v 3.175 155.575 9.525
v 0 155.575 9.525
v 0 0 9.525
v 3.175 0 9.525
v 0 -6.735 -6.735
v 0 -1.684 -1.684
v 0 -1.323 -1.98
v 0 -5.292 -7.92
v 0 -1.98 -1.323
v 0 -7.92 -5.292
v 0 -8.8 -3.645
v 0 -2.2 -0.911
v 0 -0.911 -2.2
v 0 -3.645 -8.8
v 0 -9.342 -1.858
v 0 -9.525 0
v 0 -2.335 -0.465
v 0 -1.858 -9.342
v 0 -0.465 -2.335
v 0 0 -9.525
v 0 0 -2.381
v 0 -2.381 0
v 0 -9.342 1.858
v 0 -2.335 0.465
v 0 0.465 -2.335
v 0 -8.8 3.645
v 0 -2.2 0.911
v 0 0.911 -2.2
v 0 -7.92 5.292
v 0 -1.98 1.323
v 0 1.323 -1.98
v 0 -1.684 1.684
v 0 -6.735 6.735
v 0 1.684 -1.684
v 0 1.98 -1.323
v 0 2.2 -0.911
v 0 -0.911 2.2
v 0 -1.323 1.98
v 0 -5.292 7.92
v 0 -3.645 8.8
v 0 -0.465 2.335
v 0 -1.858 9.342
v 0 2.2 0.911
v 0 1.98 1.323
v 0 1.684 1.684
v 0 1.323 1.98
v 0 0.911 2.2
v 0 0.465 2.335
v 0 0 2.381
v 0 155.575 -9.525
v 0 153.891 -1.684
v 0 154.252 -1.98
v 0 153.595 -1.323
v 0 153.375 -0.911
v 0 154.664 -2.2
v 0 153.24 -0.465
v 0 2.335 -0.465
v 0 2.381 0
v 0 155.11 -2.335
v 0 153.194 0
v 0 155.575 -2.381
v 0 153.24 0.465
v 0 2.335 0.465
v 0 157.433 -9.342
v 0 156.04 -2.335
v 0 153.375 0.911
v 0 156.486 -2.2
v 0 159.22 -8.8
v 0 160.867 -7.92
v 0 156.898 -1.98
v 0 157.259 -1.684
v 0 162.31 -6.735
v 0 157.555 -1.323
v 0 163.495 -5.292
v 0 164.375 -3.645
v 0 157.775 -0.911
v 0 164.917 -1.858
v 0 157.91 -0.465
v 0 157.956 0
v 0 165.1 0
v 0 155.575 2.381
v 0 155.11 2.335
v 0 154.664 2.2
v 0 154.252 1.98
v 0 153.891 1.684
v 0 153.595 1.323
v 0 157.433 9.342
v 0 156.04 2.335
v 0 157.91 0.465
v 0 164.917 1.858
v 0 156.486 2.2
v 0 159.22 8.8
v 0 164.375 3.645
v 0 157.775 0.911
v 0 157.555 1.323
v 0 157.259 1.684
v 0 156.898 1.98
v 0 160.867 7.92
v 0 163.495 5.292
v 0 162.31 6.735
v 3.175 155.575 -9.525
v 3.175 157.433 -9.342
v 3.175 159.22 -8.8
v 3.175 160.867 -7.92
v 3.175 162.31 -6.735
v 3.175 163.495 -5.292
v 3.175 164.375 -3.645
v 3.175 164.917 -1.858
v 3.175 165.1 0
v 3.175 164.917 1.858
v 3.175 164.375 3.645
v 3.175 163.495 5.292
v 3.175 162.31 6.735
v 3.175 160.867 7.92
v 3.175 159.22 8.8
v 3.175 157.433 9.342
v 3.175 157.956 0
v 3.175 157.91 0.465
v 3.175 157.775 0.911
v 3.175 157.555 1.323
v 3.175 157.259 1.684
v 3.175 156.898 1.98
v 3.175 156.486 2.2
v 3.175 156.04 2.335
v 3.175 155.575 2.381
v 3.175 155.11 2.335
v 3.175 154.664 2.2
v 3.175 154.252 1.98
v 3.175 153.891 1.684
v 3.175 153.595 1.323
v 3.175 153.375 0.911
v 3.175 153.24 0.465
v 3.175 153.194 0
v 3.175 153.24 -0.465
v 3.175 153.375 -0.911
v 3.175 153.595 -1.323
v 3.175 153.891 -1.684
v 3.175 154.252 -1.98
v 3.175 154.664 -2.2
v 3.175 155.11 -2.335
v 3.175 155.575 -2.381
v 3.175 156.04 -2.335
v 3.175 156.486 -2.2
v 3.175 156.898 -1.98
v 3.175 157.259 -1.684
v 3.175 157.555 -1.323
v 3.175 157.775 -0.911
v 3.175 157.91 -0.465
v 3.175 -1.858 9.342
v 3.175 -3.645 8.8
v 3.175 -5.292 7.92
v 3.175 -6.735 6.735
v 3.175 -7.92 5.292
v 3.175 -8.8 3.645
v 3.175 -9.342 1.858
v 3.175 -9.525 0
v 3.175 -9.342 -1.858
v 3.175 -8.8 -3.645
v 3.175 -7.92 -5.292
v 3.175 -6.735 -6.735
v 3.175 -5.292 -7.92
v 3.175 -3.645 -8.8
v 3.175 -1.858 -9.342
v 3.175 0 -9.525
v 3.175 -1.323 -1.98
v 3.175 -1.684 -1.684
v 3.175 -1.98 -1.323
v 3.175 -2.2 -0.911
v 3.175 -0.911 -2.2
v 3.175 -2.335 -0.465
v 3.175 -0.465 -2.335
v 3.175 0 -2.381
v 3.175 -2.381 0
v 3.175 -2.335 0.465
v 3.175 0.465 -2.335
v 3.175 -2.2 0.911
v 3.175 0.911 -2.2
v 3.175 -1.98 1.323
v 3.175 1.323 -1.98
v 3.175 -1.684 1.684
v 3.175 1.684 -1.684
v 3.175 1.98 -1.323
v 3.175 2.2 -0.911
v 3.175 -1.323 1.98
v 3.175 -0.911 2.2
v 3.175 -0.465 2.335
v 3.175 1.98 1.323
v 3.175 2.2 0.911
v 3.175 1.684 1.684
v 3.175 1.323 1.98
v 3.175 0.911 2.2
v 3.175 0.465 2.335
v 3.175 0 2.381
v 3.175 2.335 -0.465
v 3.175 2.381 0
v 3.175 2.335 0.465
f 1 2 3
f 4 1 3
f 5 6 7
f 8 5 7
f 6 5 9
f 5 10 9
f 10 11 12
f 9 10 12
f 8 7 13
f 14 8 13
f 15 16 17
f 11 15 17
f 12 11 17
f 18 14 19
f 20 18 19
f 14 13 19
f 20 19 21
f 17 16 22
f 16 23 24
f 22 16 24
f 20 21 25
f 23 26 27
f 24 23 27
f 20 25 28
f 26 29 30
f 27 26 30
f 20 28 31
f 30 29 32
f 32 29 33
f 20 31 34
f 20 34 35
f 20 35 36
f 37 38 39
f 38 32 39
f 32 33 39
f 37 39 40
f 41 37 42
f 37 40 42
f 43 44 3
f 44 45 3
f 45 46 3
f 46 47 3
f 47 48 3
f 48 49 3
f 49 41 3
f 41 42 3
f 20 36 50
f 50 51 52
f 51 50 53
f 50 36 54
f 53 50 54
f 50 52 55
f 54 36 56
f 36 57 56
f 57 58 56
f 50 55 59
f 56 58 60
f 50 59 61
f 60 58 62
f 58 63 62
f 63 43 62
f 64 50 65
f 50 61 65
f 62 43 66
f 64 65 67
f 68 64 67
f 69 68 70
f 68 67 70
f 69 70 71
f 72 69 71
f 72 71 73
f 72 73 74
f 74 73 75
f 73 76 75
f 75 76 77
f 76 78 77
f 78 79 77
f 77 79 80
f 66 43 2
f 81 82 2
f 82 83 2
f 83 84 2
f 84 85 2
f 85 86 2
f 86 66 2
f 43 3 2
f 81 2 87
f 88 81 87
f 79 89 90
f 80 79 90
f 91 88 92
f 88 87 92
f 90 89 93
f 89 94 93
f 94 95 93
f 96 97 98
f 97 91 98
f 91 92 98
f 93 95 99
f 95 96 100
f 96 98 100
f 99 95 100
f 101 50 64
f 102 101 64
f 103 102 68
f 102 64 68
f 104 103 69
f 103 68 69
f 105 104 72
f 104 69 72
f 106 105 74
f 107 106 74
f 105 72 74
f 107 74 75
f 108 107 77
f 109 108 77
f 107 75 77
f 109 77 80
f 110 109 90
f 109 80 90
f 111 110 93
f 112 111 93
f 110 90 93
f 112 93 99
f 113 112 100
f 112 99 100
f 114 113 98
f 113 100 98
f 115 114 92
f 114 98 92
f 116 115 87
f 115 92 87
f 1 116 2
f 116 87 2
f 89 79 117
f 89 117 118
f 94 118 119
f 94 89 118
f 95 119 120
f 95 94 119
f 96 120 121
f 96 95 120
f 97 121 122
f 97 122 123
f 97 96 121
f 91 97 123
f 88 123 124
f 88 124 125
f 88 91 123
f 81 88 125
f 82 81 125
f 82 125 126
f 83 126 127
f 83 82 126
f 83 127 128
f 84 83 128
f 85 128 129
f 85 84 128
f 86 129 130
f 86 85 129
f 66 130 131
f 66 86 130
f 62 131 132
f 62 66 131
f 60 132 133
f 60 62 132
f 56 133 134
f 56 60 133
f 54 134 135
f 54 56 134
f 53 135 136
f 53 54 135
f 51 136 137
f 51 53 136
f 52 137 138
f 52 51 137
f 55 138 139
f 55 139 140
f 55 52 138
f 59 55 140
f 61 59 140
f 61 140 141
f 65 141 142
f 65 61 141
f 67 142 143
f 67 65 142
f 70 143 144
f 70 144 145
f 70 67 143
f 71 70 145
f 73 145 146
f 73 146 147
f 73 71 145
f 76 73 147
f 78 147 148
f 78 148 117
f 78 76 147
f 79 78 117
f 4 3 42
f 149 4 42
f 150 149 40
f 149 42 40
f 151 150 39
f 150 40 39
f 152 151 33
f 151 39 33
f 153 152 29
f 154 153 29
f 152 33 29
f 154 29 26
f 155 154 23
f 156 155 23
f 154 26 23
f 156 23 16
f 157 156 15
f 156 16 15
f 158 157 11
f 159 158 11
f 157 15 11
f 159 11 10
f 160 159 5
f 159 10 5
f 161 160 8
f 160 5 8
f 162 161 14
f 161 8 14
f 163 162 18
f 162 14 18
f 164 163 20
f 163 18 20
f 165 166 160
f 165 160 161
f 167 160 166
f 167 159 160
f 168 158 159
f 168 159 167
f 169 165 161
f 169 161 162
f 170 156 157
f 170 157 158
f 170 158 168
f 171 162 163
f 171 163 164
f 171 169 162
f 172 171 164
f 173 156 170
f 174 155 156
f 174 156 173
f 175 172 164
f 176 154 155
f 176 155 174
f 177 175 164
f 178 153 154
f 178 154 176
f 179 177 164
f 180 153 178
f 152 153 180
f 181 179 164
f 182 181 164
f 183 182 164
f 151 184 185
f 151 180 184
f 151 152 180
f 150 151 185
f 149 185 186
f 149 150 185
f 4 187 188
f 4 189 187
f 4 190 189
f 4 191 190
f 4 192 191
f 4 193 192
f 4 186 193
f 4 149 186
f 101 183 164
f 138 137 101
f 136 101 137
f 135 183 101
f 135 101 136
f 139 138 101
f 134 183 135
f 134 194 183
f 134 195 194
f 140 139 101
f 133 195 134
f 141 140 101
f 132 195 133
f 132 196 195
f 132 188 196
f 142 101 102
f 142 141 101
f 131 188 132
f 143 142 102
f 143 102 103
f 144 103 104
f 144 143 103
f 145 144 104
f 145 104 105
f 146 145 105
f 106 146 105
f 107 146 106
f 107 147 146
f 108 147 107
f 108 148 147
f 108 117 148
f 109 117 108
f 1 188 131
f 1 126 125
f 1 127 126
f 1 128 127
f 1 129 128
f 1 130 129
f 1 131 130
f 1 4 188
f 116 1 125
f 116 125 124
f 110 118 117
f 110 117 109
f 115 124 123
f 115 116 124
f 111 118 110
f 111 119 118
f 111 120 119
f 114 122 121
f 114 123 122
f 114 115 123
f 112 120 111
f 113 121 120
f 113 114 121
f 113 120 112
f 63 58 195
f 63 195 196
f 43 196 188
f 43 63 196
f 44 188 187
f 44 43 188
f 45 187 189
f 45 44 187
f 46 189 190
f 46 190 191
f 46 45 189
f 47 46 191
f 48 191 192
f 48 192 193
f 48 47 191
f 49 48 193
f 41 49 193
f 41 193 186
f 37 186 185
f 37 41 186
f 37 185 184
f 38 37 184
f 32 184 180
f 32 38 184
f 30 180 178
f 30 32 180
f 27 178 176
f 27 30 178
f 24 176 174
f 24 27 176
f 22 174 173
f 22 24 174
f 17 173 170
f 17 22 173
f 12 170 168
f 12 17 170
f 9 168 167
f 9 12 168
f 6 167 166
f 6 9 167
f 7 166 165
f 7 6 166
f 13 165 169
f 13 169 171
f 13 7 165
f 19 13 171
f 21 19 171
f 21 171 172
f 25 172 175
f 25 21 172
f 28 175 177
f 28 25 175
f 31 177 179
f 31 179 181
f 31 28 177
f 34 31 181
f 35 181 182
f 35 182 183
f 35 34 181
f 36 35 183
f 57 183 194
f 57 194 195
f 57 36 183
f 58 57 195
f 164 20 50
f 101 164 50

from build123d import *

# Parameters (mm, degrees)
F0_R     = 2.38125
F1_DEPTH = 3.175


with BuildPart() as f1:
    # F0 (on Right) → F1 (new body)
    with BuildSketch(Plane.YZ):
        with BuildLine():
            Line((155.575, 9.525), (0, 9.525))
            ThreePointArc((0, 9.525), (-9.525, 0), (0, -9.525))
            Line((0, -9.525), (155.575, -9.525))
            ThreePointArc((155.575, -9.525), (165.1, 0), (155.575, 9.525))
        make_face()
        Circle(F0_R, mode=Mode.SUBTRACT)
        with Locations((155.575, 0)):
            Circle(F0_R, mode=Mode.SUBTRACT)
    extrude(amount=F1_DEPTH)


solid = f1.part
